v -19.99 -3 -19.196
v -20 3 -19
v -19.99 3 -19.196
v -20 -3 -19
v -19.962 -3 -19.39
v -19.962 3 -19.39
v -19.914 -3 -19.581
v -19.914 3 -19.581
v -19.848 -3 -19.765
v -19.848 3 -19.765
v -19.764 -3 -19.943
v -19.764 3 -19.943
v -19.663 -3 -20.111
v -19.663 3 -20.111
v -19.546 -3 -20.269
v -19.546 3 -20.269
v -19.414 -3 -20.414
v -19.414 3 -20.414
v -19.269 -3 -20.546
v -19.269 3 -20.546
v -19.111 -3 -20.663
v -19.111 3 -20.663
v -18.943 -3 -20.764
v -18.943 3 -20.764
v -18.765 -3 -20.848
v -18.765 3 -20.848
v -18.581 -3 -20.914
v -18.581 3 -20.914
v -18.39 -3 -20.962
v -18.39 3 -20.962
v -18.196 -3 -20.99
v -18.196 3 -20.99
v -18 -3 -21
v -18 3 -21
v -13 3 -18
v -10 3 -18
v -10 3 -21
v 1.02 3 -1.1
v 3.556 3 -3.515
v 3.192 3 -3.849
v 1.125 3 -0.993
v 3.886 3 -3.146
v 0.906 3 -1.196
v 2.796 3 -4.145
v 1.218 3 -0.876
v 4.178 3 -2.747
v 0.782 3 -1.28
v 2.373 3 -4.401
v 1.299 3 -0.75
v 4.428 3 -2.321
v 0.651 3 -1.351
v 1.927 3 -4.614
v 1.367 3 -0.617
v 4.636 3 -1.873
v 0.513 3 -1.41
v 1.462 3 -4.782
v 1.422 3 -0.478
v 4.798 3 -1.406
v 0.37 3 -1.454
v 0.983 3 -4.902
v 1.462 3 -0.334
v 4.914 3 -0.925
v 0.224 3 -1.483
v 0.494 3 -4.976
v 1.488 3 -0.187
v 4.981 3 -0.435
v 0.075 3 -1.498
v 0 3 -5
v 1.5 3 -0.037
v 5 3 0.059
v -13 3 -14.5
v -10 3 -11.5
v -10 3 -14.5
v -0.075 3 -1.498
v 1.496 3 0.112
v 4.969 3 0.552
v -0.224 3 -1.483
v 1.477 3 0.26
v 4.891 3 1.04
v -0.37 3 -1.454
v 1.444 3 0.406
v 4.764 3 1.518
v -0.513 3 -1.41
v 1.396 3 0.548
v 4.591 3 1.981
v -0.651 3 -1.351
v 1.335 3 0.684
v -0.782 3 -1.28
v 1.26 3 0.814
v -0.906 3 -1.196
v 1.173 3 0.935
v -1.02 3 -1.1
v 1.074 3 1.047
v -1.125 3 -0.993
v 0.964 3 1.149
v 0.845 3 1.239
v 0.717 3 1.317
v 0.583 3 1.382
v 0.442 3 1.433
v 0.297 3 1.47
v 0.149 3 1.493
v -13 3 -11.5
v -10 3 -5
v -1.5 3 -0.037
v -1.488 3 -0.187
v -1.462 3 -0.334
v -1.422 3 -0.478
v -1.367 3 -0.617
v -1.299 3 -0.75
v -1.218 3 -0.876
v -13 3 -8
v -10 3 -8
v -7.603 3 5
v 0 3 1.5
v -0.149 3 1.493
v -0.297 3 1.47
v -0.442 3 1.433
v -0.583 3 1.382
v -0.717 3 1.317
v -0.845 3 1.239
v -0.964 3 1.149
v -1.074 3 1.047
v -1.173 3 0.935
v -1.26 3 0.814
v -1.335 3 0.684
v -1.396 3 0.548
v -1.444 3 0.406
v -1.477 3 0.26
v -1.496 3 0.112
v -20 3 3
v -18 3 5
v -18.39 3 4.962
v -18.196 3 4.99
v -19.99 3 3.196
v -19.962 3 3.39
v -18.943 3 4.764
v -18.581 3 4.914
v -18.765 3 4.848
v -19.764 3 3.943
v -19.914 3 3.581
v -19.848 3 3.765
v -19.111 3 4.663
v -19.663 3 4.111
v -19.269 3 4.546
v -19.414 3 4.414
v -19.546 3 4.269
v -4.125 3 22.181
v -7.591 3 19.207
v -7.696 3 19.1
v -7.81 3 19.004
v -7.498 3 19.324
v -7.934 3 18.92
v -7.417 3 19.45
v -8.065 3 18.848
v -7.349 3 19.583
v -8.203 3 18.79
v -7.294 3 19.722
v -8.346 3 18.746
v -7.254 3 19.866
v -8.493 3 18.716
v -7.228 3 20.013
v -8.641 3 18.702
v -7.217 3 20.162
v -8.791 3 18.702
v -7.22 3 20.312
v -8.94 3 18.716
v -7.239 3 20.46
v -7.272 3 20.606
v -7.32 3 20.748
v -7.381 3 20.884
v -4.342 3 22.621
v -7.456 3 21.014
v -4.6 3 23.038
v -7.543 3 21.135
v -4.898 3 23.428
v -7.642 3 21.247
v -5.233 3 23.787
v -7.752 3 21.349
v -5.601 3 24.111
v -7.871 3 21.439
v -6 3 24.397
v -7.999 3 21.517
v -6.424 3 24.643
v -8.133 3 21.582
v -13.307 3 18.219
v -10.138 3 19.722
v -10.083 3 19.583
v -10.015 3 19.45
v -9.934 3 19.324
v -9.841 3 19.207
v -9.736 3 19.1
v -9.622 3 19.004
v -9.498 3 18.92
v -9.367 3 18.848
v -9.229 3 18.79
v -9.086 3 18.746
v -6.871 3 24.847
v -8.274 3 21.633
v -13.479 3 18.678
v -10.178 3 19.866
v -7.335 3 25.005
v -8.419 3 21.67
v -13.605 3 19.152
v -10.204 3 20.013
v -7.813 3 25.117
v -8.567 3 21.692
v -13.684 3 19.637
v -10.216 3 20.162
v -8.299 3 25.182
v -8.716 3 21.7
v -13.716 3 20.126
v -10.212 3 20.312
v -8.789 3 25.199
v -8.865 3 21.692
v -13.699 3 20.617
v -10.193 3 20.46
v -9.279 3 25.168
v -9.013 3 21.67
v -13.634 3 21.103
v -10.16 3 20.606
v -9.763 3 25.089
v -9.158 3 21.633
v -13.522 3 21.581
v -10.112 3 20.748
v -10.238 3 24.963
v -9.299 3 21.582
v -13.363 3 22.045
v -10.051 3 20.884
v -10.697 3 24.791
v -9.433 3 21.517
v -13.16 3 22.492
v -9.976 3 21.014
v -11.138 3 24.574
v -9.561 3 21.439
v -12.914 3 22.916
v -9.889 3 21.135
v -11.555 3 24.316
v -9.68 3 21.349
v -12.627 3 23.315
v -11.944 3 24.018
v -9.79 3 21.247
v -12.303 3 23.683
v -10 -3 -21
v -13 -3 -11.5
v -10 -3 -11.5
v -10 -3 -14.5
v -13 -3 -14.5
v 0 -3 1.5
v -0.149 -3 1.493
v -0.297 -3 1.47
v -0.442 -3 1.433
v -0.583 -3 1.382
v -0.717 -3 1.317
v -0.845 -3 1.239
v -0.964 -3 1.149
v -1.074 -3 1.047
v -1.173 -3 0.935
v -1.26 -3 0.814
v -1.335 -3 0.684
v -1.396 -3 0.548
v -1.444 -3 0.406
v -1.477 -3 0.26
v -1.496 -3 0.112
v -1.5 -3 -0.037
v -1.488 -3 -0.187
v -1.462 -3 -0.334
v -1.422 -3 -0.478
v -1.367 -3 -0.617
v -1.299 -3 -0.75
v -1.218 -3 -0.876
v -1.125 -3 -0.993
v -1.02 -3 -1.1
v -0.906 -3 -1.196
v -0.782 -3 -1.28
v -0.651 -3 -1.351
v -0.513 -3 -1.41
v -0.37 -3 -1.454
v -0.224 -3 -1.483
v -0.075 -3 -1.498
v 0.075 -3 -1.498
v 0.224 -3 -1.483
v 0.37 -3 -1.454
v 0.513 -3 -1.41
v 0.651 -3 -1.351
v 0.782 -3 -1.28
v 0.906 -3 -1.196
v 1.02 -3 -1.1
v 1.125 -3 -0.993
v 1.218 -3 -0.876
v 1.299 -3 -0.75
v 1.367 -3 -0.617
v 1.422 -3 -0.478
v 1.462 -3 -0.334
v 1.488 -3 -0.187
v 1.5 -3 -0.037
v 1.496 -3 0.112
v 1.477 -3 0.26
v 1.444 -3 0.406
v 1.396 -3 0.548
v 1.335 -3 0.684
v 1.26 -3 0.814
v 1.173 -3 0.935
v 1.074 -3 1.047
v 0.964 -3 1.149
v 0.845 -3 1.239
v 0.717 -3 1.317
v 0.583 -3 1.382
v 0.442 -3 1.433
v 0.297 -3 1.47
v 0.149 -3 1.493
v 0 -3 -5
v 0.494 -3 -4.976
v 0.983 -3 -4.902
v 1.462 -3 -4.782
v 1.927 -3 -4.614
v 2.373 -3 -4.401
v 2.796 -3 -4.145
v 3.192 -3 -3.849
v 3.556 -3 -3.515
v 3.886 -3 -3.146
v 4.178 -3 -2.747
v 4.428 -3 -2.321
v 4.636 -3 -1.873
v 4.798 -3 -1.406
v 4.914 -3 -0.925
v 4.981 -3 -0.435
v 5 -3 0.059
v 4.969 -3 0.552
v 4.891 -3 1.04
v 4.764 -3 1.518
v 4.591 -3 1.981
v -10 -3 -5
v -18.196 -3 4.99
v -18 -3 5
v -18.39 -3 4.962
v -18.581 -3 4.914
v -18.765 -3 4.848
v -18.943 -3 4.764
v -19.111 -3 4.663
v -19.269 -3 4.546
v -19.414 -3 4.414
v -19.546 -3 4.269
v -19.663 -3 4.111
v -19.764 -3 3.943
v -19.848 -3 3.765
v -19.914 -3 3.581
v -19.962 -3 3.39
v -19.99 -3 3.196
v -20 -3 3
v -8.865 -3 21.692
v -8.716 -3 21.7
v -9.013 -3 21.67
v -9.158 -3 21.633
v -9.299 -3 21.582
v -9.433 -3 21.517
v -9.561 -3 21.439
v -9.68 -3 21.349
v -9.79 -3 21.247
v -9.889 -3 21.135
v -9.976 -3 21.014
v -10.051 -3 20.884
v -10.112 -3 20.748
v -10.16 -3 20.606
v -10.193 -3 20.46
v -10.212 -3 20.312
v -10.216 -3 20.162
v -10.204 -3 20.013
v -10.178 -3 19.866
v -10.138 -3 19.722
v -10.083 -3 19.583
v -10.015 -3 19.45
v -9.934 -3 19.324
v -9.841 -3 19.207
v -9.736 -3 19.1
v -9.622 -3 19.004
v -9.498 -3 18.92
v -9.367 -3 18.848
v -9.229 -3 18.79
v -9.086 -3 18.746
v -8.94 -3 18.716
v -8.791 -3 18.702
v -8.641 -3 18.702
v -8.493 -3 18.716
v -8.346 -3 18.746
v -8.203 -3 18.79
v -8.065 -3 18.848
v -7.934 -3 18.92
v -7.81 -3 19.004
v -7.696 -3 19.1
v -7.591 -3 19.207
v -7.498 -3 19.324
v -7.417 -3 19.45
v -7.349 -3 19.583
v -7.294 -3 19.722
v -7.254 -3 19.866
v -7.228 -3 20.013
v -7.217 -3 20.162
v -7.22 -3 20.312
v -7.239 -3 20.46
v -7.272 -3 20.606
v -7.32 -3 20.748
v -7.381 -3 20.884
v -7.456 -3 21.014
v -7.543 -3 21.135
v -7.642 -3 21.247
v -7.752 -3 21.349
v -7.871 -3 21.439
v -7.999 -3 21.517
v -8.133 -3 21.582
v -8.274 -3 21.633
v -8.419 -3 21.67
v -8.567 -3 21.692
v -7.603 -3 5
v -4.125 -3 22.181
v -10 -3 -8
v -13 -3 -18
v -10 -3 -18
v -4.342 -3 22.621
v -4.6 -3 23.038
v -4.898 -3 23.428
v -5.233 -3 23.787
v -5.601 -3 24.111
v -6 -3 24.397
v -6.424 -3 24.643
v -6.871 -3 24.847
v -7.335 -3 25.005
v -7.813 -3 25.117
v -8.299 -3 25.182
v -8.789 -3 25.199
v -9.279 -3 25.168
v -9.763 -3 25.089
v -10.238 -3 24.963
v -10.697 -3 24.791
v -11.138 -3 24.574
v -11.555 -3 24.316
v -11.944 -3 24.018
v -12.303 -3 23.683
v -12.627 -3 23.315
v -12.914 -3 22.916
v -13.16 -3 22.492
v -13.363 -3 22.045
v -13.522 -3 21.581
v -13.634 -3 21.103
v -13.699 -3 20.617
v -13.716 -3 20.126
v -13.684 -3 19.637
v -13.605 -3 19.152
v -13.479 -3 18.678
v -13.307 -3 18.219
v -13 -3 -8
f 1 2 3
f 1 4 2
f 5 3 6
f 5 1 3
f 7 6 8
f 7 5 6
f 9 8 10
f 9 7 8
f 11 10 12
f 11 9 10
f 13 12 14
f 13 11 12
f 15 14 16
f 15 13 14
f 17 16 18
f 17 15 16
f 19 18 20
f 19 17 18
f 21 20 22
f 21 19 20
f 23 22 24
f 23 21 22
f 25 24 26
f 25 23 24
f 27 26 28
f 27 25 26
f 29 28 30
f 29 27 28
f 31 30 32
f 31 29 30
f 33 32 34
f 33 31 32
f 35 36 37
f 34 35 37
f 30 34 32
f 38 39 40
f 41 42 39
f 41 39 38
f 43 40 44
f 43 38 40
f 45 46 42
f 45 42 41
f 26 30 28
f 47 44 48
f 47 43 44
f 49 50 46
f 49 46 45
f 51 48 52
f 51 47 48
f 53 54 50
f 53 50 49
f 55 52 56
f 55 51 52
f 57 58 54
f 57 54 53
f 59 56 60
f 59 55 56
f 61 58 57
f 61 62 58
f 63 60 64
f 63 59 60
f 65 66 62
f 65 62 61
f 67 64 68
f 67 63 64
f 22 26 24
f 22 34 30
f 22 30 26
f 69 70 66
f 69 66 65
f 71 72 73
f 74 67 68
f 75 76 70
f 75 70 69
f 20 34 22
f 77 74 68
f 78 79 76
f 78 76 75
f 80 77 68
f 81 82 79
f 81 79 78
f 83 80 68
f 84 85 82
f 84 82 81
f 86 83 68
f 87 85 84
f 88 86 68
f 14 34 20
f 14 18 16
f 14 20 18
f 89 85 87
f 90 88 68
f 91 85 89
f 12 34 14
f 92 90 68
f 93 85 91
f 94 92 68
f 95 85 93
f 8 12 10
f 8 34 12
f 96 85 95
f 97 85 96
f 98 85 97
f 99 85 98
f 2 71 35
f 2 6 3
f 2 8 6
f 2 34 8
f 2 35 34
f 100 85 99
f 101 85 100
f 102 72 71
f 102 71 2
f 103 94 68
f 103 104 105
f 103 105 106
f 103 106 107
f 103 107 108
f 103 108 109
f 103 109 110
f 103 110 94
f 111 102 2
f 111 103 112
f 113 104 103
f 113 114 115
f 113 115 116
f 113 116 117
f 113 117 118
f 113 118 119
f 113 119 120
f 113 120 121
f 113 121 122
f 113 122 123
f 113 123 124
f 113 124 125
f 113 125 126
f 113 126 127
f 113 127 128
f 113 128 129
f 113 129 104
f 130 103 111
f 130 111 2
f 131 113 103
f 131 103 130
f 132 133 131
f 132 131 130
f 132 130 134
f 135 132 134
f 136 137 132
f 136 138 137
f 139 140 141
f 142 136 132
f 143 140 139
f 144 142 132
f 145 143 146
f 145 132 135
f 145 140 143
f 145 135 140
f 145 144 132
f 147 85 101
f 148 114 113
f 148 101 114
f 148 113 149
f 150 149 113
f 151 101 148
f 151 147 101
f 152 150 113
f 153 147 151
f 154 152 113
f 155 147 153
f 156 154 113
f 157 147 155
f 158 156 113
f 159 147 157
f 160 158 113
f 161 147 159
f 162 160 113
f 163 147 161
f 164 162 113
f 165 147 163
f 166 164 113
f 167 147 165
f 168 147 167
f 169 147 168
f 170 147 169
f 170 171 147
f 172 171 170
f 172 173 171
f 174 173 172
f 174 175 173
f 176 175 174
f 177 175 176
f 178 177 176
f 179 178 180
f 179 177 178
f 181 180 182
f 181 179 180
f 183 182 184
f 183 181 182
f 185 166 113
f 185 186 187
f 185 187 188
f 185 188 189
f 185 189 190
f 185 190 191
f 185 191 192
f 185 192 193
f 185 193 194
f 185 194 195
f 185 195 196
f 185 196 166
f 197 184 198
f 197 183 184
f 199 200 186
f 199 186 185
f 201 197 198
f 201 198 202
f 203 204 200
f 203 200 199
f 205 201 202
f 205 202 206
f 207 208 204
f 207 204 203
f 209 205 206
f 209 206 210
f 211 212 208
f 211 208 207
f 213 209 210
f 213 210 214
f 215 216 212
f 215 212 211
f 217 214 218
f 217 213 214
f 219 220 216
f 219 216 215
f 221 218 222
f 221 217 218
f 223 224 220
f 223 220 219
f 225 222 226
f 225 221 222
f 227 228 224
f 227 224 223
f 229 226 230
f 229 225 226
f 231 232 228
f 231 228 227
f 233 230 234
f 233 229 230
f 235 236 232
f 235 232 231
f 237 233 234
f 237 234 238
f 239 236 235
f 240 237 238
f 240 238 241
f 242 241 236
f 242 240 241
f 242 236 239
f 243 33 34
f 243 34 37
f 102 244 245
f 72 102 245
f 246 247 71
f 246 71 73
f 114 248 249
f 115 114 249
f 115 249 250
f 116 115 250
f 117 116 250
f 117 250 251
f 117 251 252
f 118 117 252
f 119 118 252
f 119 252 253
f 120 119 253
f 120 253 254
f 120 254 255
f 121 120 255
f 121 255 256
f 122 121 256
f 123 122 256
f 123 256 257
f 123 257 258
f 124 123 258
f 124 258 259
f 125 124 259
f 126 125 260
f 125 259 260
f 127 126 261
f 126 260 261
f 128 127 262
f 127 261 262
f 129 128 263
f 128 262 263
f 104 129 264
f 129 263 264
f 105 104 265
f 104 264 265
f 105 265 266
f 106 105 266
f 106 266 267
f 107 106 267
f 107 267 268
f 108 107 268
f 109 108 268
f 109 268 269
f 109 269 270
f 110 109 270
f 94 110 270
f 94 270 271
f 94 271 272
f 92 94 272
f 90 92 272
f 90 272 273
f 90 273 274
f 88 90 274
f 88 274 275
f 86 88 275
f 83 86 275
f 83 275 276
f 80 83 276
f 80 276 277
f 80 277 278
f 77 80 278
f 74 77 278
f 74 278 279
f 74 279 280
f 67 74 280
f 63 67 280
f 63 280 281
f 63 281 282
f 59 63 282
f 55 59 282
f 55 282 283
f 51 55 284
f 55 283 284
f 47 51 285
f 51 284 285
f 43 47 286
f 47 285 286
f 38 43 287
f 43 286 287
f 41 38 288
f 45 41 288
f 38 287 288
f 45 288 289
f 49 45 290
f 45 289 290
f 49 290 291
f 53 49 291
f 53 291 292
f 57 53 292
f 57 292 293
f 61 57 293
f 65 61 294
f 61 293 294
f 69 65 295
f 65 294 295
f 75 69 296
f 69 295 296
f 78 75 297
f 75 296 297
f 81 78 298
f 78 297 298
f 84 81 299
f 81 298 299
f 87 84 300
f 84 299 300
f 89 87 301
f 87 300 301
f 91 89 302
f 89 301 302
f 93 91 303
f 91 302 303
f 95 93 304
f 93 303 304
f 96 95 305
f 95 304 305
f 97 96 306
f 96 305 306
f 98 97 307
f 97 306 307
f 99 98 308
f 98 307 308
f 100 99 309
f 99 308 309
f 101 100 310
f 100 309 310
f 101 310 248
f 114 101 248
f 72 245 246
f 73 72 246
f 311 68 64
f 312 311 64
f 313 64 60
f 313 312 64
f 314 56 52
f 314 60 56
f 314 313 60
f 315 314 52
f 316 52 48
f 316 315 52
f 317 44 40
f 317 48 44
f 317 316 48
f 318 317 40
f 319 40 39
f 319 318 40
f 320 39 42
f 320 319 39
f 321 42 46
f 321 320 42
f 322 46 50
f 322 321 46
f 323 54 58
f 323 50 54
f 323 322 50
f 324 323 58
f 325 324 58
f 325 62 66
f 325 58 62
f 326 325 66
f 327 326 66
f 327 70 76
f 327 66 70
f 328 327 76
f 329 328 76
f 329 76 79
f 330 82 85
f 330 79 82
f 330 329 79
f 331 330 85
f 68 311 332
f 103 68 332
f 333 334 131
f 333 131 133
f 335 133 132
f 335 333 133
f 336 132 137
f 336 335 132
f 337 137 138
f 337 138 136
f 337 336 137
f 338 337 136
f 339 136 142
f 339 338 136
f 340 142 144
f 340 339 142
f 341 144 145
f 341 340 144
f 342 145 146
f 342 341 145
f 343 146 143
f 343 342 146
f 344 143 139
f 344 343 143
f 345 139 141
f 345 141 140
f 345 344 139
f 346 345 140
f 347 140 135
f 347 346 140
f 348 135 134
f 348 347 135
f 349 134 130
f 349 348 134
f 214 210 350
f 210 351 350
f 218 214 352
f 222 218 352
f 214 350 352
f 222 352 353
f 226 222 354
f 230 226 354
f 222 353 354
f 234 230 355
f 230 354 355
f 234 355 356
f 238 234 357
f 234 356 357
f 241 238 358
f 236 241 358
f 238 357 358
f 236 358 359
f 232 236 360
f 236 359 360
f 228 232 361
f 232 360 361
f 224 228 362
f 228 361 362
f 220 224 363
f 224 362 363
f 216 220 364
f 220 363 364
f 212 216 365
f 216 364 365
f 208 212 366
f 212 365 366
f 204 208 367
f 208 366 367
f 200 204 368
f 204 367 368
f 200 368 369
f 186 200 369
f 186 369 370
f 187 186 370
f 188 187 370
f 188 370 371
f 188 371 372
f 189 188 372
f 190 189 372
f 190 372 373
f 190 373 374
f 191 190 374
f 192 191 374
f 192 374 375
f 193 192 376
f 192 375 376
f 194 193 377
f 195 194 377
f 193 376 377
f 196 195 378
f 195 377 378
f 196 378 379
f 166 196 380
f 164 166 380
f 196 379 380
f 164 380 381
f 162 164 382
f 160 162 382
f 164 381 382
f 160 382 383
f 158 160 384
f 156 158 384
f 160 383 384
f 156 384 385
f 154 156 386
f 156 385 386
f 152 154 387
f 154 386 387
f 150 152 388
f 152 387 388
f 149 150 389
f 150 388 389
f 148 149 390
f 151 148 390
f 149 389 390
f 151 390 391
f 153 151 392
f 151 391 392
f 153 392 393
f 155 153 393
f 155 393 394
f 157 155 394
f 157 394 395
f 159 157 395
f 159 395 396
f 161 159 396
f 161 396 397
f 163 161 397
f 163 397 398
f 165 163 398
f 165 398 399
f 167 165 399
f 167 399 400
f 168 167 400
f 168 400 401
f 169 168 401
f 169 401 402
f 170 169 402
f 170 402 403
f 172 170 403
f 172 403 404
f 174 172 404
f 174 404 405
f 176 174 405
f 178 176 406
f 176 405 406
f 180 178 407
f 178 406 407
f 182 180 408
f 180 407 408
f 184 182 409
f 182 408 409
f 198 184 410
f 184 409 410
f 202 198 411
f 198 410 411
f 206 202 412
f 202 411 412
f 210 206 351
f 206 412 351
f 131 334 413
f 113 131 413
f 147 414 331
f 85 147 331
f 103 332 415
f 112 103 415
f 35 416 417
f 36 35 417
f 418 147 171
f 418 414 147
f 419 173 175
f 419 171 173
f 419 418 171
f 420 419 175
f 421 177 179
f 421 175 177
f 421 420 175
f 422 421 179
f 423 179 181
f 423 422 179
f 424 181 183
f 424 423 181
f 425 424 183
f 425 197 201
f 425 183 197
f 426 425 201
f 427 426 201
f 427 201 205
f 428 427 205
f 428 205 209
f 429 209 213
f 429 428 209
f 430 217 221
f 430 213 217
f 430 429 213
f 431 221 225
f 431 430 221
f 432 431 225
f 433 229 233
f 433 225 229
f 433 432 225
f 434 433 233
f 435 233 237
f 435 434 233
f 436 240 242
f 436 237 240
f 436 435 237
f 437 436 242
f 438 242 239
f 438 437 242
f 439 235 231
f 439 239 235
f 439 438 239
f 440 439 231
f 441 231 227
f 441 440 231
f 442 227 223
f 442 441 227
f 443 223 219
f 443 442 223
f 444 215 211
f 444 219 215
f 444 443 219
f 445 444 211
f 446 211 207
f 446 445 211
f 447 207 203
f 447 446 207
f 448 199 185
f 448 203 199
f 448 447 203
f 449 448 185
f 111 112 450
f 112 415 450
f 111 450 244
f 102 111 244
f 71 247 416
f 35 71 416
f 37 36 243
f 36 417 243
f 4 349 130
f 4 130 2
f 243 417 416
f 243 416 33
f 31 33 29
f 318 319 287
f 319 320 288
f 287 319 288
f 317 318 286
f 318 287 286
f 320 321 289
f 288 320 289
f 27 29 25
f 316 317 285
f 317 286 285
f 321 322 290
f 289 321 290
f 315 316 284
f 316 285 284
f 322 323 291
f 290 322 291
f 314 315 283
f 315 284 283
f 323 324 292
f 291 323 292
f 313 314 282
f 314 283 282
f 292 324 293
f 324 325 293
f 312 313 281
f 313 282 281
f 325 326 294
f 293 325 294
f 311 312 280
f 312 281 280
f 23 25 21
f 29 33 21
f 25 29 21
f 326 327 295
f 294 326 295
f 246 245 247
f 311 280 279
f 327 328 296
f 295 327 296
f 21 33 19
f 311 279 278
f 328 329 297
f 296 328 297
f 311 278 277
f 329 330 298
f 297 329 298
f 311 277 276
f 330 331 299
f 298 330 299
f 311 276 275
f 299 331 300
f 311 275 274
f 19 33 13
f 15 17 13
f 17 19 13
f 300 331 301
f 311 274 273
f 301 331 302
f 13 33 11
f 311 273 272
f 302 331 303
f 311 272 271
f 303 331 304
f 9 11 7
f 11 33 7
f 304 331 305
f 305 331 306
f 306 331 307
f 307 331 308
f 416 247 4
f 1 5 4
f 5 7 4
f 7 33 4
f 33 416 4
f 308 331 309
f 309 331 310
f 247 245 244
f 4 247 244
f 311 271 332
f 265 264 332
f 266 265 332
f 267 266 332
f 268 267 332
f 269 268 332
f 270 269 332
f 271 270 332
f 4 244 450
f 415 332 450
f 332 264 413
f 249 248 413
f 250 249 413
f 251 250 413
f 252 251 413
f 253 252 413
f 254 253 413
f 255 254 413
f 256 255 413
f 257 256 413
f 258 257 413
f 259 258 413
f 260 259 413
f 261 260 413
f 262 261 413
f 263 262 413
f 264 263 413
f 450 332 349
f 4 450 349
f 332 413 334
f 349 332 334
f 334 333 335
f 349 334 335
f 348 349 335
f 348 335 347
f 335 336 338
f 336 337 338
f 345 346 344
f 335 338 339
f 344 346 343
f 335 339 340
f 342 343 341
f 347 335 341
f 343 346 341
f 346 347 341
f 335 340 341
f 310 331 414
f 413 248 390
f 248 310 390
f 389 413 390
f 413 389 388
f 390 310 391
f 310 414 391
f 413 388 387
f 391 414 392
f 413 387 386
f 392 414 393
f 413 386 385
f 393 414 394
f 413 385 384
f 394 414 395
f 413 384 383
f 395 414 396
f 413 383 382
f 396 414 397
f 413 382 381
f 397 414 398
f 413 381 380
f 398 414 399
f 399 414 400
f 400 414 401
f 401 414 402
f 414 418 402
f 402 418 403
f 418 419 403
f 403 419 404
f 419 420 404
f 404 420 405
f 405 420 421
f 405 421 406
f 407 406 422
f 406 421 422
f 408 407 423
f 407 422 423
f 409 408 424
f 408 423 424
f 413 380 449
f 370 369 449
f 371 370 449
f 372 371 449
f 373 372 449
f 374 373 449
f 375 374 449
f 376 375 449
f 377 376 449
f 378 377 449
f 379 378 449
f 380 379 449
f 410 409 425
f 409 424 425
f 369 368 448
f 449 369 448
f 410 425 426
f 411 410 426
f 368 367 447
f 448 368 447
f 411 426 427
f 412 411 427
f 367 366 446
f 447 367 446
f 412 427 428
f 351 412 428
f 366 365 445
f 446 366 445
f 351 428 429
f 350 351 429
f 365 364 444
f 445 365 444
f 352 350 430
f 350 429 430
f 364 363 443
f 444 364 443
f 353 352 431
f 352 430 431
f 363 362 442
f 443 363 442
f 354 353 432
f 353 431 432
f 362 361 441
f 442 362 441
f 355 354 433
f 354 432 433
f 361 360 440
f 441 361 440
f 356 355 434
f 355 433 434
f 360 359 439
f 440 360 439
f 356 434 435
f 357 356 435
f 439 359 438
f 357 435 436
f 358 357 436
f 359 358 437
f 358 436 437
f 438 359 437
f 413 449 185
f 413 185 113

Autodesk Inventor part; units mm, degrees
ref_plane "YZ Plane" through (0, 0, 0) normal (1, 0, 0) x (0, 1, 0)
ref_plane "XZ Plane" through (0, 0, 0) normal (0, 1, 0) x (-1, 0, 0)
ref_plane "XY Plane" through (0, 0, 0) normal (0, 0, 1) x (1, 0, 0)
sketch "Szkic1" plane through (0, 0, 0) normal (0, 1, 0) x (-1, 0, 0)
  arc A0 (13.307, 18.2188) -> (4.1253, 22.1807) centre (8.7161, 20.1997) ccw
  line L0 (4.1253, 22.1807) -> (-4.5909, 1.9809)
  line L1 (13.307, 18.2188) -> (7.6031, 5)
  arc A1 (-4.5909, 1.9809) -> (0, -5) centre (0, 0) ccw
  line L2 (8, -5) -> (10.5, -5) construction
  line L3 (10, -19) -> (10, -20)
  line L4 (10, -20) -> (10, -21)
  line L5 (10, -7) -> (10, -5)
  line L6 (10, -12) -> (10, -14)
  line L7 (10, -14) -> (10, -14.5)
  line L8 (20, -21) -> (10, -21)
  line L9 (13, -18) -> (10, -18)
  line L10 (10, -18) -> (10, -19)
  line L11 (10, -7) -> (10, -8)
  line L12 (10, -8) -> (13, -8)
  line L13 (13, -11.5) -> (10, -11.5)
  line L14 (10, -11.5) -> (10, -12)
  line L15 (13, -14.5) -> (10, -14.5)
  line L16 (10, -18) -> (13, -18)
  line L17 (13, -8) -> (13, -11.5)
  line L18 (13, -14.5) -> (13, -18)
  line L19 (18, 5) -> (20, 5)
  line L20 (20, 5) -> (20, -21)
  line L21 (20, -21) -> (18, -21)
  line L22 (0, -5) -> (10, -5)
  line L23 (18, 5) -> (7.6031, 5)
  arc A2 (13.307, 18.2188) -> (4.1253, 22.1807) centre (8.7161, 20.1997) ccw
extrude "Wyciągnięcie proste6" add sketch "Szkic1" along normal mid plane 6
fillet "Zaokrąglenie3" radius 2 2 edges at (-20, 0, -21) (-20, 0, 5)
fillet_without_effect "Fillet4"
sketch "Sketch8" plane through (0, 3, 0) normal (0, 1, 0) x (1, 0, 0)
  point P0 (0, 0)
  point P1 (0, 0)
hole "Hole1" at (0, 3, 0) direction (0, -1, 0) diameter 3 end through all
sketch "Sketch9" plane through (0, 3, 0) normal (0, 1, 0) x (1, 0, 0)
  arc A0 (-13.307, -18.2188) -> (-4.1253, -22.1807) centre (-8.7161, -20.1997) ccw projected
  point P0 (0, 0)
hole "Hole2" at (-8.7161, 3, 20.1997) direction (0, -1, 0) diameter 3 end through all
properties part number "Chwytak wersja 3 - baza"
